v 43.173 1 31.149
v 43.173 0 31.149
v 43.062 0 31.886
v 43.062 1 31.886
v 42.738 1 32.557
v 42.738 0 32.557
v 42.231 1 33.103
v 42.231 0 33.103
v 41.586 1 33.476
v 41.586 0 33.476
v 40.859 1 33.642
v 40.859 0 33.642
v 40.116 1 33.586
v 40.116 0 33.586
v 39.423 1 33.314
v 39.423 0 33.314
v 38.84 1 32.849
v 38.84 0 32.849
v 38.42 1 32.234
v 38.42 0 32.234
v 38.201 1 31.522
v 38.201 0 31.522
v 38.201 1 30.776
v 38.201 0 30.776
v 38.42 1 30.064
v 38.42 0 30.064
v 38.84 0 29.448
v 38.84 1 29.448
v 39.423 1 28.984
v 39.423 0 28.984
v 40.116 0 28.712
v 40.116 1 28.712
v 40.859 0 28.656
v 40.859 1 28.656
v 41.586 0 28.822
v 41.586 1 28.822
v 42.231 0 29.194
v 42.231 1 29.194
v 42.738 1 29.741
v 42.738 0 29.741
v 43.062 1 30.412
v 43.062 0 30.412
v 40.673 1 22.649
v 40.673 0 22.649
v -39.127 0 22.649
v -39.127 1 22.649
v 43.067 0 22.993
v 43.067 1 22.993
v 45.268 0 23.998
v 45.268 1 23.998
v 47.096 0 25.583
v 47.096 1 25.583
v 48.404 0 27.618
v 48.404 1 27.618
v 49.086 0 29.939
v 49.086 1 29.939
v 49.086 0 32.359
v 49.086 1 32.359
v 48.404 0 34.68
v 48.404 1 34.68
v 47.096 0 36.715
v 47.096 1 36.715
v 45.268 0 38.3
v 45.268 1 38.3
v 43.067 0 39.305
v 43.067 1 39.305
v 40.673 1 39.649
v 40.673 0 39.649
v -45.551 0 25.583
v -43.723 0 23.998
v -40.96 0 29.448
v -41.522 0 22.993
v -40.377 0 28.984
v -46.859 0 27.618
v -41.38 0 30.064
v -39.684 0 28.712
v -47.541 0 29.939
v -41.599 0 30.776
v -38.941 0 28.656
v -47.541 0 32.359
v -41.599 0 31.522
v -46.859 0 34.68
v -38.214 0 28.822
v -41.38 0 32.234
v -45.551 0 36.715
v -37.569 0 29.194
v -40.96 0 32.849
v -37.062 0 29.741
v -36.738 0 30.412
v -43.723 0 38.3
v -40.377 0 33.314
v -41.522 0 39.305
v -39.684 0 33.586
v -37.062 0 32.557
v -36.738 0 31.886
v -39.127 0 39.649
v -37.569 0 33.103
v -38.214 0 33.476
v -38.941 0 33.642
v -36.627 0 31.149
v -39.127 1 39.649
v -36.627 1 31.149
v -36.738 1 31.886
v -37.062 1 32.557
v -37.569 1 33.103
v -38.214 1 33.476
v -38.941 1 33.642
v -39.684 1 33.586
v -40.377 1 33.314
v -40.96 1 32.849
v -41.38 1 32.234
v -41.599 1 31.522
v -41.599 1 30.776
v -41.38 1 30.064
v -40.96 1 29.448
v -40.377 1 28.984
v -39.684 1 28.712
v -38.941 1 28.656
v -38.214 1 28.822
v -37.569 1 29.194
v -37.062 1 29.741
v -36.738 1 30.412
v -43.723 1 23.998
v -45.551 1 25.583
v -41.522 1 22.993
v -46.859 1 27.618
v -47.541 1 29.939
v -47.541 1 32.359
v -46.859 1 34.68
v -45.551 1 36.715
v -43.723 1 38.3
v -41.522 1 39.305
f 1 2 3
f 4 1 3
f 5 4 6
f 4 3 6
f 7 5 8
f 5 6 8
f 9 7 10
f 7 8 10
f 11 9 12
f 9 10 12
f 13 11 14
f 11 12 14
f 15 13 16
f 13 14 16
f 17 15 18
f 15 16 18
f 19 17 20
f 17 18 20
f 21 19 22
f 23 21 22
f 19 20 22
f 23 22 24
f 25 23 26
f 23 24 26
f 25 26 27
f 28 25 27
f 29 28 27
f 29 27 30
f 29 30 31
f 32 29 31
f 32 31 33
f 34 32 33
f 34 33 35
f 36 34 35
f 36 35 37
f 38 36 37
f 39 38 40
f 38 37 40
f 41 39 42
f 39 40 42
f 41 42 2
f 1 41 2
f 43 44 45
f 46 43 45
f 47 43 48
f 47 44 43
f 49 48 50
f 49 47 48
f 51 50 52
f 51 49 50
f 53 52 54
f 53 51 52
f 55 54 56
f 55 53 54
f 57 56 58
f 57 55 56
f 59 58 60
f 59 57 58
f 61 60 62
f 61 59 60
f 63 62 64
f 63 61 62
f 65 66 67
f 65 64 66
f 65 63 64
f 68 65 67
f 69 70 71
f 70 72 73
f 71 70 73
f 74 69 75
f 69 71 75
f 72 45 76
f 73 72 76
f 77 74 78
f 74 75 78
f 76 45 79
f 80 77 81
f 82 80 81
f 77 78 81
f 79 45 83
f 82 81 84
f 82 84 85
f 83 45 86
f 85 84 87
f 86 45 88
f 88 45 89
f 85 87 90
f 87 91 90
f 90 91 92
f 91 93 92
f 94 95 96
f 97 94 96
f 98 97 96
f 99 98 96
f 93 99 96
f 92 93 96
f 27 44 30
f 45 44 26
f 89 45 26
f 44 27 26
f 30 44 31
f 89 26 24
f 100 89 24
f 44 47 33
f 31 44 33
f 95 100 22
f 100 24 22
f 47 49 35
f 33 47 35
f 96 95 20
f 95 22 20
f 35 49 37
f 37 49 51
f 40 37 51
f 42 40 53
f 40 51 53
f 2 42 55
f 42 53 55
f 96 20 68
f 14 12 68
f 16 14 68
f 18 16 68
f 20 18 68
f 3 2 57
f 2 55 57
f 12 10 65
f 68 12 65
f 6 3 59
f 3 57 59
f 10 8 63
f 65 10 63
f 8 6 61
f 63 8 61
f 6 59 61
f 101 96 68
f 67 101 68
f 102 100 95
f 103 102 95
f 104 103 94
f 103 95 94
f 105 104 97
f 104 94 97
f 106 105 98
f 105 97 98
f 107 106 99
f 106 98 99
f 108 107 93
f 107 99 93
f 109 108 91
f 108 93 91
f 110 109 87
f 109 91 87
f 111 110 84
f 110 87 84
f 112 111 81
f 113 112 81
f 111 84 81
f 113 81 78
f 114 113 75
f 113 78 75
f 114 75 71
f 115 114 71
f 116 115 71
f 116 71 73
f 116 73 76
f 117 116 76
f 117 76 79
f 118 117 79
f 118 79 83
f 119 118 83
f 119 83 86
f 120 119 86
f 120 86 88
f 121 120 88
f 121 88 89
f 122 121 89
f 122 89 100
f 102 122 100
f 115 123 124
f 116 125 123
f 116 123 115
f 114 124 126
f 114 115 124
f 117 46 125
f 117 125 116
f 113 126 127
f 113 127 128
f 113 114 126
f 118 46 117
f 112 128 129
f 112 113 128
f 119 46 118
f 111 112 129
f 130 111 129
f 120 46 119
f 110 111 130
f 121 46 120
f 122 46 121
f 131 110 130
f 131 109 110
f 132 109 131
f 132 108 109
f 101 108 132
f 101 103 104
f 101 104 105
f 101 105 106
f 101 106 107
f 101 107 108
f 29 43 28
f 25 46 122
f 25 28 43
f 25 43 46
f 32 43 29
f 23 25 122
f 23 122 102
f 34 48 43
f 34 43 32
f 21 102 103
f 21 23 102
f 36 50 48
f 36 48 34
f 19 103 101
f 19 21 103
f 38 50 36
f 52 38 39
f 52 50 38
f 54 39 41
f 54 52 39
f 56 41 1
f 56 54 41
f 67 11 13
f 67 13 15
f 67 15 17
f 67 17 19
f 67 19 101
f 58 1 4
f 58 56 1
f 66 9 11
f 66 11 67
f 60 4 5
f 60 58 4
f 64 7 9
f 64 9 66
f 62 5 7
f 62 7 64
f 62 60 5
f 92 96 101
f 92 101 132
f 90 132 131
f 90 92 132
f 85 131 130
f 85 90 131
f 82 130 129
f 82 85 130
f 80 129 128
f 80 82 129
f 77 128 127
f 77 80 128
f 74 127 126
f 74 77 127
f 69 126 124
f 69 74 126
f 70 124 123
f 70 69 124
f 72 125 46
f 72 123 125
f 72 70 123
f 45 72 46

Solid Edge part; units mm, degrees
sketch "Sketch1" plane through (0, 0, 0) normal (0, -1, 0) x (1, 0, 0)
  circle A0 centre (-39.1274, 31.1489) radius 2.5
  line L0 (40.6726, 22.6489) -> (-39.1274, 22.6489)
  line L1 (-39.1274, 39.6489) -> (40.6726, 39.6489)
  arc A1 (-39.1274, 22.6489) -> (-39.1274, 39.6489) centre (-39.1274, 31.1489) cw
  arc A2 (40.6726, 39.6489) -> (40.6726, 22.6489) centre (40.6726, 31.1489) cw
  circle A3 centre (40.6726, 31.1489) radius 2.5
extrude "Protrusion1" add sketch "Sketch1" against normal blind 1
